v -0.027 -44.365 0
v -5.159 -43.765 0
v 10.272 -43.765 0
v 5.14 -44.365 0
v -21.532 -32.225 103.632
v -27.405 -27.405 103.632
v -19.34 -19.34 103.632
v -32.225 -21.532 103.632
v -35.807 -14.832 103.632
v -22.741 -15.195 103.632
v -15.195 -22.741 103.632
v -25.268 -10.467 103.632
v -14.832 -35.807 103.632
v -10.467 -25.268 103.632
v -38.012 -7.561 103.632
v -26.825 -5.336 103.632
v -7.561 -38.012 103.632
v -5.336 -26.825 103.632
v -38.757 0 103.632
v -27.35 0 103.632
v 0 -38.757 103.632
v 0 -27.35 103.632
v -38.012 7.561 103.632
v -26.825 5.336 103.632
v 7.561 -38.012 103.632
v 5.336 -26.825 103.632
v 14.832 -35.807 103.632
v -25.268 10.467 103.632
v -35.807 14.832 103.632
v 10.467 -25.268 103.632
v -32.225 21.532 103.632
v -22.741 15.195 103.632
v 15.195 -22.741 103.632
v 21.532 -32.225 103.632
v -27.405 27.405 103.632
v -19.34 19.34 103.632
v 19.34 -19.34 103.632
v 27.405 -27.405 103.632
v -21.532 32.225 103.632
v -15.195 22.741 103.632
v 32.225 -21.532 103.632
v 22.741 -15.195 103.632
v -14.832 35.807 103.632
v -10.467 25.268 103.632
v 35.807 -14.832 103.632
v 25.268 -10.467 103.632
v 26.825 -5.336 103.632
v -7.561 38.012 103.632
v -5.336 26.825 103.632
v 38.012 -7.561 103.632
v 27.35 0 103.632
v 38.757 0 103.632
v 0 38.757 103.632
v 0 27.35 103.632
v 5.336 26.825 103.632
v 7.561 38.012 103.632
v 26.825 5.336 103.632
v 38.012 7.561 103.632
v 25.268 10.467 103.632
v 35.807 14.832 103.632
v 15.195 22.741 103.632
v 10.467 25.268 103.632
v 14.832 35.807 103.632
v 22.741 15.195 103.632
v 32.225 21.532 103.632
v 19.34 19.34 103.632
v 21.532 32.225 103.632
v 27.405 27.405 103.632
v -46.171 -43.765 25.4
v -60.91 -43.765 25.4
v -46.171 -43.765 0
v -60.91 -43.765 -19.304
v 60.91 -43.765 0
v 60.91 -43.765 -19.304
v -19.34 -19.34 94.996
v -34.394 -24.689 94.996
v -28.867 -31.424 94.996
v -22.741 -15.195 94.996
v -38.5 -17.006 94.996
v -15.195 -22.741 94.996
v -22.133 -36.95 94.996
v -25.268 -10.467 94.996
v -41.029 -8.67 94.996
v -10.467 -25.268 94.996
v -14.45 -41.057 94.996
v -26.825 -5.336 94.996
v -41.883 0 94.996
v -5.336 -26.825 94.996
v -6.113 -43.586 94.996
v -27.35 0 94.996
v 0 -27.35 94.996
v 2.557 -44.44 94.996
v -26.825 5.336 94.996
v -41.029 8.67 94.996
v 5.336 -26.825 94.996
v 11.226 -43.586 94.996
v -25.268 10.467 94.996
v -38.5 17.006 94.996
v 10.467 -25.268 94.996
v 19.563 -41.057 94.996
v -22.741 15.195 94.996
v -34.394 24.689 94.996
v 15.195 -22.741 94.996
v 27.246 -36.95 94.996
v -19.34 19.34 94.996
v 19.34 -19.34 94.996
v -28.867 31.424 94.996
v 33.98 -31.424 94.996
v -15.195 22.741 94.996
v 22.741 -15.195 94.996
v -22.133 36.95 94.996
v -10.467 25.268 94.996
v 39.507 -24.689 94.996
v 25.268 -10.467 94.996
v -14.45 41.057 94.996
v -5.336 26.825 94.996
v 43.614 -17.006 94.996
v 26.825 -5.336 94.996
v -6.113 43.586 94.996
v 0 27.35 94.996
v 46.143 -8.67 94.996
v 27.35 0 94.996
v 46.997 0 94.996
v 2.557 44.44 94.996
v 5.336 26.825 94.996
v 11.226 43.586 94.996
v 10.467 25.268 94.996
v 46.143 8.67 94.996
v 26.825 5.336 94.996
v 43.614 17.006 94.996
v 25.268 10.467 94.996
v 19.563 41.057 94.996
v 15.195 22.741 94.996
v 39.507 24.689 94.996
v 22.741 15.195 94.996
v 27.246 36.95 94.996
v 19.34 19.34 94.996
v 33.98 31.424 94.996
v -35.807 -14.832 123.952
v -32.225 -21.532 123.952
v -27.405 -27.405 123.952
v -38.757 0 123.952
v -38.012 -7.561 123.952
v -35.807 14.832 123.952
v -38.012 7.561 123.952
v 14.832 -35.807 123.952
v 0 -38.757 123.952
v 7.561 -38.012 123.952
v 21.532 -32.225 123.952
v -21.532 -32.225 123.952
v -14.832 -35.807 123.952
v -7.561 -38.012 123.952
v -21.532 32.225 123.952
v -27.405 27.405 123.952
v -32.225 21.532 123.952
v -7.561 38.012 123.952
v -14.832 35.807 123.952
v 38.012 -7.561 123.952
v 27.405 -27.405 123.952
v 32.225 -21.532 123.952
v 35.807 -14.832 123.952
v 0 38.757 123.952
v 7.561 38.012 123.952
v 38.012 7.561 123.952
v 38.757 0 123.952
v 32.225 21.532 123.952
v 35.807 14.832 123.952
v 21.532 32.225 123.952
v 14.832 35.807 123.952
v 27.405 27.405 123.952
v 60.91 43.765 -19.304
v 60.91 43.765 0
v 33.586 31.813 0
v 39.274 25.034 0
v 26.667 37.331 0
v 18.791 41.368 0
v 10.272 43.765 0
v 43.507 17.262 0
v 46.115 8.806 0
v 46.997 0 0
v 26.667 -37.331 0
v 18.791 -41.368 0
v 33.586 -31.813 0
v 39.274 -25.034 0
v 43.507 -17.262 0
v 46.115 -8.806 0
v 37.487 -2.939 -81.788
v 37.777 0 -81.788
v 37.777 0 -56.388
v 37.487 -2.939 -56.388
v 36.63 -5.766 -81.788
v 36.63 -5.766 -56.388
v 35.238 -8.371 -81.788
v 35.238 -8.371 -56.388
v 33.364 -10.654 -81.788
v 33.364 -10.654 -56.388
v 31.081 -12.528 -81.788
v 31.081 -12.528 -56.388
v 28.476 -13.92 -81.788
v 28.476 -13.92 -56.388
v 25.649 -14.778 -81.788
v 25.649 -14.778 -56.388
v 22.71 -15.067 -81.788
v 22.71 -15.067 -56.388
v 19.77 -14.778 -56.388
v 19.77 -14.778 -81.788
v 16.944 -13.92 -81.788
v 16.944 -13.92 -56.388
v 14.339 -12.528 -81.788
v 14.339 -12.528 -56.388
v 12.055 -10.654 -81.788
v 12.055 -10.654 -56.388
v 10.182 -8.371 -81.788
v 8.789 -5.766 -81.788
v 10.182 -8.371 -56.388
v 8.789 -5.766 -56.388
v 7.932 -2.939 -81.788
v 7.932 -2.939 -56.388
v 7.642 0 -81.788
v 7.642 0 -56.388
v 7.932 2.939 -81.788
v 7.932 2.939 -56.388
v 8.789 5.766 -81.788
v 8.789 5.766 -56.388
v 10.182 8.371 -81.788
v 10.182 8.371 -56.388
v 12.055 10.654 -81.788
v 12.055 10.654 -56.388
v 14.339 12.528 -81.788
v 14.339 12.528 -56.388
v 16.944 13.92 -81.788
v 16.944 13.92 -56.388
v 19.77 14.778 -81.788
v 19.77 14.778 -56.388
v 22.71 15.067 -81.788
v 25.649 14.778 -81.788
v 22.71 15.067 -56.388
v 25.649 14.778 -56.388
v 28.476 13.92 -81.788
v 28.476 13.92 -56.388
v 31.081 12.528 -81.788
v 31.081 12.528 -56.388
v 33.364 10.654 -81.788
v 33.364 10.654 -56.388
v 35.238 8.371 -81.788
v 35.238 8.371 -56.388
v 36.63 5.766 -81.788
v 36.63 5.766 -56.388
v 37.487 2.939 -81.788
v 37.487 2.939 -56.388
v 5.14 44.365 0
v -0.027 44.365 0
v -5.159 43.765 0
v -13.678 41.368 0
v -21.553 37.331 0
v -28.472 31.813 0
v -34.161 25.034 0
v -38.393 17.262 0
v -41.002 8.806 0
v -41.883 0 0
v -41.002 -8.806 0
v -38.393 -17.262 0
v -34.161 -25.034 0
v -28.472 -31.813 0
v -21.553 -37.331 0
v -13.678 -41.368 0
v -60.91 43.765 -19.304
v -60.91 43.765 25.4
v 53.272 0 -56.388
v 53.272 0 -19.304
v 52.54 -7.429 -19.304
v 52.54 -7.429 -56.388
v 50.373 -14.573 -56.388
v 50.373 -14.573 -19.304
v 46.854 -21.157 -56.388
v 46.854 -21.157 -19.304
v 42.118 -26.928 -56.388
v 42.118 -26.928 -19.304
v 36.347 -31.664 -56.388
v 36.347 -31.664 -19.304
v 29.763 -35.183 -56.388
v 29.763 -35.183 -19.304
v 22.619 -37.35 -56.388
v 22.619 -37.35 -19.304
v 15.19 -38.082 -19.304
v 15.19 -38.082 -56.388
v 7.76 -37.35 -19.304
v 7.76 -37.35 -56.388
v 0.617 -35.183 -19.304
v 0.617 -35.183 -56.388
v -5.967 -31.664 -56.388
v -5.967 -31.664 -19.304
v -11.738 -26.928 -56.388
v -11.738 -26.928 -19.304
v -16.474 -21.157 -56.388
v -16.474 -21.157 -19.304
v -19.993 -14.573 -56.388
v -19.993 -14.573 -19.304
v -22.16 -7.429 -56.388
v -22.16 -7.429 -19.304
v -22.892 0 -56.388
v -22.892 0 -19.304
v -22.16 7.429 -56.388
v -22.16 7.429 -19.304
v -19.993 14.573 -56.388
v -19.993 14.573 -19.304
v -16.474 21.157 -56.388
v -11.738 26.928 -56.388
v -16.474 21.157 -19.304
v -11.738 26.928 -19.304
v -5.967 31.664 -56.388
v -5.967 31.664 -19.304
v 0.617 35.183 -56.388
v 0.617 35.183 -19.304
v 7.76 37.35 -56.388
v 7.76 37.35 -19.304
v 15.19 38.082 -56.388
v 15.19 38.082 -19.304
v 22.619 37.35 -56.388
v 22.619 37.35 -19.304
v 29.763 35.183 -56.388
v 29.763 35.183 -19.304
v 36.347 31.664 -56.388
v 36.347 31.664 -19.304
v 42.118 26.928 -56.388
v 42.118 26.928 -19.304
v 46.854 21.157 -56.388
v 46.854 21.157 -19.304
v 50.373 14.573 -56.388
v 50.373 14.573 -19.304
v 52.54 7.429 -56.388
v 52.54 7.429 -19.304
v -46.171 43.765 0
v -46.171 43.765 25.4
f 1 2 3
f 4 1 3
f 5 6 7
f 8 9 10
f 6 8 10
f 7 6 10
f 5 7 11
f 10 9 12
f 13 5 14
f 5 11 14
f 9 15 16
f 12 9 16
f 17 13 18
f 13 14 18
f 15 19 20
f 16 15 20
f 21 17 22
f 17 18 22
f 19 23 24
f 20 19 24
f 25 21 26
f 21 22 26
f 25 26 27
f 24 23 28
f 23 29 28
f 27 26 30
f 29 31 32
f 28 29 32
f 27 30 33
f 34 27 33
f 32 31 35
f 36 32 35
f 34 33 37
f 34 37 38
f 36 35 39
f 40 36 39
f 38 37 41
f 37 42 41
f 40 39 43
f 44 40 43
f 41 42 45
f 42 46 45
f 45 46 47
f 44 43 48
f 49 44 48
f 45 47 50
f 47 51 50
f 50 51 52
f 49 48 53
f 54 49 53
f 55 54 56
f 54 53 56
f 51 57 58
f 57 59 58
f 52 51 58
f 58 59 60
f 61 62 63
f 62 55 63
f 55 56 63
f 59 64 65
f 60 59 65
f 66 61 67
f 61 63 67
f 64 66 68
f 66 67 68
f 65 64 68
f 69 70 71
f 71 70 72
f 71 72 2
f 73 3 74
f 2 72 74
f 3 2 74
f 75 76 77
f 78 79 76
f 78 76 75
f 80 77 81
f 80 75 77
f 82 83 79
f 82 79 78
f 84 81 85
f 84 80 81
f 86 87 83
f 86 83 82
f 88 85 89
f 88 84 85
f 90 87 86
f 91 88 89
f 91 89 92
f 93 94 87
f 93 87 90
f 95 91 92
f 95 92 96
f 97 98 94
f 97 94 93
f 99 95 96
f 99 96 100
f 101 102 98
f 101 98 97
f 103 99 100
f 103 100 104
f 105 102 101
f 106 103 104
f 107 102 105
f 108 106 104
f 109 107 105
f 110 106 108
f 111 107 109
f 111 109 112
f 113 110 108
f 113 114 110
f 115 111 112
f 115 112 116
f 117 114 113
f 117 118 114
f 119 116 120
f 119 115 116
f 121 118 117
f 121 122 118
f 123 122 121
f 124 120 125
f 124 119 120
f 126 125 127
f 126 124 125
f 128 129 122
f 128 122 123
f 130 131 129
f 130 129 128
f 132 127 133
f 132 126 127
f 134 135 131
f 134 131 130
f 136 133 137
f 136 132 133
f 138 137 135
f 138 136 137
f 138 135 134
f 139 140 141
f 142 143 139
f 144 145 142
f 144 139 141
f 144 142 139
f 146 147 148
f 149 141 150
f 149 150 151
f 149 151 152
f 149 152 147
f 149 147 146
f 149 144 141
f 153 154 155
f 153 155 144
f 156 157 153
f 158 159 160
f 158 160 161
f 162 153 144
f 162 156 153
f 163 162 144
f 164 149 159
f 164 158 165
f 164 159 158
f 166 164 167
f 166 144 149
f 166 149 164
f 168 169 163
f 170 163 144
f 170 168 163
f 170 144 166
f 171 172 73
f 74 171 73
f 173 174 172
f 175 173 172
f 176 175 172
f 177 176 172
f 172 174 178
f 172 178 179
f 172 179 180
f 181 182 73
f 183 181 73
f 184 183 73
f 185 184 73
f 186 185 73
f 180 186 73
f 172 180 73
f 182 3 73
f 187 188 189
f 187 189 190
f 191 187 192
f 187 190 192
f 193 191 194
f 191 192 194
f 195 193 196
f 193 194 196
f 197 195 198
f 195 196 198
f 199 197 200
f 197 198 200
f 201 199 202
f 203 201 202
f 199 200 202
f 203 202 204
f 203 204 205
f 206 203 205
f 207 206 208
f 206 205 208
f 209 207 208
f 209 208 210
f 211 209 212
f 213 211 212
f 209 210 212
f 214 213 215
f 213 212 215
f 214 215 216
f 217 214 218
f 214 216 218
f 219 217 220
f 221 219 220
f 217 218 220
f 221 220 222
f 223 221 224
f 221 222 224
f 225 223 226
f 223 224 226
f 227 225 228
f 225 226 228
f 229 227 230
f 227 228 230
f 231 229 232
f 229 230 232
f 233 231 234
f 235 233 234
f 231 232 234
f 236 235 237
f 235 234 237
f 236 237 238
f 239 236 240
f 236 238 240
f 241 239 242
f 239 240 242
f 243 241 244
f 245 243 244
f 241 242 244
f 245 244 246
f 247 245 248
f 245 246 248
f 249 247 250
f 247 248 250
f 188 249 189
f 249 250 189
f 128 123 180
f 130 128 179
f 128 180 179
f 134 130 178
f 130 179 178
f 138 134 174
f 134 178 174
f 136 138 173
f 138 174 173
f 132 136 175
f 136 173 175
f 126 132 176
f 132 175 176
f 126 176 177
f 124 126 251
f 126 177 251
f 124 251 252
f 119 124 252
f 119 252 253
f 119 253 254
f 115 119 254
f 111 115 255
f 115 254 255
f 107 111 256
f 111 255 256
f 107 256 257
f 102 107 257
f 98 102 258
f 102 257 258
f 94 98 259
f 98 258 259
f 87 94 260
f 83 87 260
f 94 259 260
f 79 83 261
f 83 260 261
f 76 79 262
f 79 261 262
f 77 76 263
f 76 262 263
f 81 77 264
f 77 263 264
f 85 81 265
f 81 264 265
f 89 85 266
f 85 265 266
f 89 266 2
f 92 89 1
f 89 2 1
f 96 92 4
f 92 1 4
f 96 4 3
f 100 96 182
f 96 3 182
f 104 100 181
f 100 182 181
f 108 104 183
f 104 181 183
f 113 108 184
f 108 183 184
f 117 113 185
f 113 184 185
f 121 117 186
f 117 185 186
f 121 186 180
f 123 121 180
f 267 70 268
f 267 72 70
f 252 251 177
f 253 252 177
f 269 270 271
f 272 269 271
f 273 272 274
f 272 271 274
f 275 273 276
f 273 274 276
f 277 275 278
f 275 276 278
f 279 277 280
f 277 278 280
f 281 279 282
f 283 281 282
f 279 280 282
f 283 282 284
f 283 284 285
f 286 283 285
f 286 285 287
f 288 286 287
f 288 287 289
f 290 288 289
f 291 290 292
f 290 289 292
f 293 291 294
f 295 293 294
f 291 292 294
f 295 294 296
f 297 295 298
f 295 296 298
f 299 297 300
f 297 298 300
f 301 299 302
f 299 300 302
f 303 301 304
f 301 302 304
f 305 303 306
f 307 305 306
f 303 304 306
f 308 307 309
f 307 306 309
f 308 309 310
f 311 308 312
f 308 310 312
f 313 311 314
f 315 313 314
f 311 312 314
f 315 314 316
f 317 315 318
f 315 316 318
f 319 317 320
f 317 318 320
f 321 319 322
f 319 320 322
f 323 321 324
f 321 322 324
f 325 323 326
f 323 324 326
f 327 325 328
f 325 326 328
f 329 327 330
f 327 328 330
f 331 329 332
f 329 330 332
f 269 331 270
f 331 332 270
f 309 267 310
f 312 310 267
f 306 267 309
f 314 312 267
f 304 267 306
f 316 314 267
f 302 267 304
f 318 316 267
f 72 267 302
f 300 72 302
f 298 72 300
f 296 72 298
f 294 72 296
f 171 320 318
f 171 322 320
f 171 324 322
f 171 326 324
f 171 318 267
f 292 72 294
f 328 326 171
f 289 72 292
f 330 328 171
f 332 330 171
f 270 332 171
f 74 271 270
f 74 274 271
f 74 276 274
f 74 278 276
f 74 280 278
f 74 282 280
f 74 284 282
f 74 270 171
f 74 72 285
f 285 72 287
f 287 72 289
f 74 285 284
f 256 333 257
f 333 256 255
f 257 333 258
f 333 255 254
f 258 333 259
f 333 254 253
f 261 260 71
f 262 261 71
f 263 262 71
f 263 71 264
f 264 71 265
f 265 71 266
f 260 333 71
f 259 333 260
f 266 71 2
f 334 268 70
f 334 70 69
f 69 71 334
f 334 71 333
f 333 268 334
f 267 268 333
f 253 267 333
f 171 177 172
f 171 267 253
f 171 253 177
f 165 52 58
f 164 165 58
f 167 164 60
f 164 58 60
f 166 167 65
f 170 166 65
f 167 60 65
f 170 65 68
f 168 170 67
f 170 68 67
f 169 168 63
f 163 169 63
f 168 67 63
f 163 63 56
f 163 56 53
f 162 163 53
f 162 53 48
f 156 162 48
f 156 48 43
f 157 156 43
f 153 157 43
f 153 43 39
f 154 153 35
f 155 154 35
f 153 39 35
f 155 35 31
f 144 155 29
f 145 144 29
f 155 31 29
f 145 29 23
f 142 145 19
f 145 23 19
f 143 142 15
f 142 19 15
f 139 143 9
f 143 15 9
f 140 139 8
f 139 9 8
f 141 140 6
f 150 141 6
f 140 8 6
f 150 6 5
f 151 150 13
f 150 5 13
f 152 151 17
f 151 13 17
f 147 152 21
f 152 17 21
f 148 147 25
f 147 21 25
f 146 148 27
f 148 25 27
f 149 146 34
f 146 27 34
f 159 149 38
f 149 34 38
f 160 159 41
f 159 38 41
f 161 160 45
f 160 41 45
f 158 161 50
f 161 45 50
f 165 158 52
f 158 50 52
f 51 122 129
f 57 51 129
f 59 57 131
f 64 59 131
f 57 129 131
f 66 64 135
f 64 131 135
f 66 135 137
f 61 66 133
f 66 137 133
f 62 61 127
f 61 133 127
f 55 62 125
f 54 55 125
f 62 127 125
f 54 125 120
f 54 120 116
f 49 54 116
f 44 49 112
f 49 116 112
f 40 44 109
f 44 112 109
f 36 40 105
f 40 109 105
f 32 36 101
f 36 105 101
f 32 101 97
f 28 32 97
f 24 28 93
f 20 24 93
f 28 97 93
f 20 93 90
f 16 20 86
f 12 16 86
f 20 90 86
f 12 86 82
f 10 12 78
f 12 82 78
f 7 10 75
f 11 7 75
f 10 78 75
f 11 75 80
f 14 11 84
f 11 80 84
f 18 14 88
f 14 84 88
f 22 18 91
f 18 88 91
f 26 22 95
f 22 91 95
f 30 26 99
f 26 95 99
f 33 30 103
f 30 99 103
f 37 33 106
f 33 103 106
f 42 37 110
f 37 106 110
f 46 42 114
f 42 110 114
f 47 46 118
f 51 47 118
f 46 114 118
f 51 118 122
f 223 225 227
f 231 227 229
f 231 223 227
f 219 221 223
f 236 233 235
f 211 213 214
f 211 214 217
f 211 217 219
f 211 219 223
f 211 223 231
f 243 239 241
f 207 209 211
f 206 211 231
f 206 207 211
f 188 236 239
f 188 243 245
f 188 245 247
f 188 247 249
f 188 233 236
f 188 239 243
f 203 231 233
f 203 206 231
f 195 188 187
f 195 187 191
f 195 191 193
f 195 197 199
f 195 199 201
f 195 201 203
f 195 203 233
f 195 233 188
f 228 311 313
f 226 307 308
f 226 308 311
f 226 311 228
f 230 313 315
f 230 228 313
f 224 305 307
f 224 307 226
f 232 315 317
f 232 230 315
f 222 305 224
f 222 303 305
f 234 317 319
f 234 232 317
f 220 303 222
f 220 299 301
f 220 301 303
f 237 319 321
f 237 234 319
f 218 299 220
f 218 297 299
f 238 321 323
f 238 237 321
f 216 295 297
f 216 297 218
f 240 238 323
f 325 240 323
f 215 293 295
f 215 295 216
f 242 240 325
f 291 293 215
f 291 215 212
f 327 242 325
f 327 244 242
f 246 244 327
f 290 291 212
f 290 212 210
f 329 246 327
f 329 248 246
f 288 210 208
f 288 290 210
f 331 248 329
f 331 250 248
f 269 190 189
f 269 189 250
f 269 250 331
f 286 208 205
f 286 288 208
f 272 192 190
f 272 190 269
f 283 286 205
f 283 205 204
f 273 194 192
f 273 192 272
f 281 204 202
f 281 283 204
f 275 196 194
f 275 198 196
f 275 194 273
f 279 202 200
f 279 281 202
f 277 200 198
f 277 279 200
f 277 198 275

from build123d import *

# Parameters (mm, degrees)
F0_R      = 44.4398
F1_DEPTH  = 94.996
F2_W      = 121.819742
F2_H      = 87.529742
F3_DEPTH  = 19.304
F4_R      = 38.081956
F5_DEPTH  = 37.084
F6_R      = 15.067271
F7_DEPTH  = 25.4
F8_R      = 27.350413
F9_DEPTH  = 8.636
F10_R     = 38.756929
F11_DEPTH = 20.32
F12_W     = 14.738686
F12_H     = 87.529742
F13_DEPTH = 25.4


with BuildPart() as f1:
    # F0 (on Top) → F1 (new body)
    with BuildSketch(Plane.XY):
        with Locations((2.556712, 0)):
            Circle(F0_R)
    extrude(amount=F1_DEPTH)

    # F2 (on face) → F3 (join)
    with BuildSketch(Plane(origin=(0, 0, 0), x_dir=(1, 0, 0), z_dir=(0, 0, -1))):
        Rectangle(F2_W, F2_H)
    extrude(amount=F3_DEPTH)

    # F4 (on face) → F5 (join)
    with BuildSketch(Plane(origin=(0, 0, -19.304), x_dir=(1, 0, 0), z_dir=(0, 0, -1))):
        with Locations((15.189868, 0)):
            Circle(F4_R)
    extrude(amount=F5_DEPTH)

    # F6 (on face) → F7 (join)
    with BuildSketch(Plane(origin=(0, 0, -56.388), x_dir=(1, 0, 0), z_dir=(0, 0, -1))):
        with Locations((22.709604, 0)):
            Circle(F6_R)
    extrude(amount=F7_DEPTH)

    # F8 (on face) → F9 (join)
    with BuildSketch(Plane.XY.offset(94.996)):
        Circle(F8_R)
    extrude(amount=F9_DEPTH)

    # F10 (on face) → F11 (join)
    with BuildSketch(Plane.XY.offset(103.632)):
        Circle(F10_R)
    extrude(amount=F11_DEPTH)

    # F12 (on face) → F13 (join)
    with BuildSketch(Plane.XY):
        with Locations((-53.540528, 0)):
            Rectangle(F12_W, F12_H)
    extrude(amount=F13_DEPTH)


solid = f1.part
